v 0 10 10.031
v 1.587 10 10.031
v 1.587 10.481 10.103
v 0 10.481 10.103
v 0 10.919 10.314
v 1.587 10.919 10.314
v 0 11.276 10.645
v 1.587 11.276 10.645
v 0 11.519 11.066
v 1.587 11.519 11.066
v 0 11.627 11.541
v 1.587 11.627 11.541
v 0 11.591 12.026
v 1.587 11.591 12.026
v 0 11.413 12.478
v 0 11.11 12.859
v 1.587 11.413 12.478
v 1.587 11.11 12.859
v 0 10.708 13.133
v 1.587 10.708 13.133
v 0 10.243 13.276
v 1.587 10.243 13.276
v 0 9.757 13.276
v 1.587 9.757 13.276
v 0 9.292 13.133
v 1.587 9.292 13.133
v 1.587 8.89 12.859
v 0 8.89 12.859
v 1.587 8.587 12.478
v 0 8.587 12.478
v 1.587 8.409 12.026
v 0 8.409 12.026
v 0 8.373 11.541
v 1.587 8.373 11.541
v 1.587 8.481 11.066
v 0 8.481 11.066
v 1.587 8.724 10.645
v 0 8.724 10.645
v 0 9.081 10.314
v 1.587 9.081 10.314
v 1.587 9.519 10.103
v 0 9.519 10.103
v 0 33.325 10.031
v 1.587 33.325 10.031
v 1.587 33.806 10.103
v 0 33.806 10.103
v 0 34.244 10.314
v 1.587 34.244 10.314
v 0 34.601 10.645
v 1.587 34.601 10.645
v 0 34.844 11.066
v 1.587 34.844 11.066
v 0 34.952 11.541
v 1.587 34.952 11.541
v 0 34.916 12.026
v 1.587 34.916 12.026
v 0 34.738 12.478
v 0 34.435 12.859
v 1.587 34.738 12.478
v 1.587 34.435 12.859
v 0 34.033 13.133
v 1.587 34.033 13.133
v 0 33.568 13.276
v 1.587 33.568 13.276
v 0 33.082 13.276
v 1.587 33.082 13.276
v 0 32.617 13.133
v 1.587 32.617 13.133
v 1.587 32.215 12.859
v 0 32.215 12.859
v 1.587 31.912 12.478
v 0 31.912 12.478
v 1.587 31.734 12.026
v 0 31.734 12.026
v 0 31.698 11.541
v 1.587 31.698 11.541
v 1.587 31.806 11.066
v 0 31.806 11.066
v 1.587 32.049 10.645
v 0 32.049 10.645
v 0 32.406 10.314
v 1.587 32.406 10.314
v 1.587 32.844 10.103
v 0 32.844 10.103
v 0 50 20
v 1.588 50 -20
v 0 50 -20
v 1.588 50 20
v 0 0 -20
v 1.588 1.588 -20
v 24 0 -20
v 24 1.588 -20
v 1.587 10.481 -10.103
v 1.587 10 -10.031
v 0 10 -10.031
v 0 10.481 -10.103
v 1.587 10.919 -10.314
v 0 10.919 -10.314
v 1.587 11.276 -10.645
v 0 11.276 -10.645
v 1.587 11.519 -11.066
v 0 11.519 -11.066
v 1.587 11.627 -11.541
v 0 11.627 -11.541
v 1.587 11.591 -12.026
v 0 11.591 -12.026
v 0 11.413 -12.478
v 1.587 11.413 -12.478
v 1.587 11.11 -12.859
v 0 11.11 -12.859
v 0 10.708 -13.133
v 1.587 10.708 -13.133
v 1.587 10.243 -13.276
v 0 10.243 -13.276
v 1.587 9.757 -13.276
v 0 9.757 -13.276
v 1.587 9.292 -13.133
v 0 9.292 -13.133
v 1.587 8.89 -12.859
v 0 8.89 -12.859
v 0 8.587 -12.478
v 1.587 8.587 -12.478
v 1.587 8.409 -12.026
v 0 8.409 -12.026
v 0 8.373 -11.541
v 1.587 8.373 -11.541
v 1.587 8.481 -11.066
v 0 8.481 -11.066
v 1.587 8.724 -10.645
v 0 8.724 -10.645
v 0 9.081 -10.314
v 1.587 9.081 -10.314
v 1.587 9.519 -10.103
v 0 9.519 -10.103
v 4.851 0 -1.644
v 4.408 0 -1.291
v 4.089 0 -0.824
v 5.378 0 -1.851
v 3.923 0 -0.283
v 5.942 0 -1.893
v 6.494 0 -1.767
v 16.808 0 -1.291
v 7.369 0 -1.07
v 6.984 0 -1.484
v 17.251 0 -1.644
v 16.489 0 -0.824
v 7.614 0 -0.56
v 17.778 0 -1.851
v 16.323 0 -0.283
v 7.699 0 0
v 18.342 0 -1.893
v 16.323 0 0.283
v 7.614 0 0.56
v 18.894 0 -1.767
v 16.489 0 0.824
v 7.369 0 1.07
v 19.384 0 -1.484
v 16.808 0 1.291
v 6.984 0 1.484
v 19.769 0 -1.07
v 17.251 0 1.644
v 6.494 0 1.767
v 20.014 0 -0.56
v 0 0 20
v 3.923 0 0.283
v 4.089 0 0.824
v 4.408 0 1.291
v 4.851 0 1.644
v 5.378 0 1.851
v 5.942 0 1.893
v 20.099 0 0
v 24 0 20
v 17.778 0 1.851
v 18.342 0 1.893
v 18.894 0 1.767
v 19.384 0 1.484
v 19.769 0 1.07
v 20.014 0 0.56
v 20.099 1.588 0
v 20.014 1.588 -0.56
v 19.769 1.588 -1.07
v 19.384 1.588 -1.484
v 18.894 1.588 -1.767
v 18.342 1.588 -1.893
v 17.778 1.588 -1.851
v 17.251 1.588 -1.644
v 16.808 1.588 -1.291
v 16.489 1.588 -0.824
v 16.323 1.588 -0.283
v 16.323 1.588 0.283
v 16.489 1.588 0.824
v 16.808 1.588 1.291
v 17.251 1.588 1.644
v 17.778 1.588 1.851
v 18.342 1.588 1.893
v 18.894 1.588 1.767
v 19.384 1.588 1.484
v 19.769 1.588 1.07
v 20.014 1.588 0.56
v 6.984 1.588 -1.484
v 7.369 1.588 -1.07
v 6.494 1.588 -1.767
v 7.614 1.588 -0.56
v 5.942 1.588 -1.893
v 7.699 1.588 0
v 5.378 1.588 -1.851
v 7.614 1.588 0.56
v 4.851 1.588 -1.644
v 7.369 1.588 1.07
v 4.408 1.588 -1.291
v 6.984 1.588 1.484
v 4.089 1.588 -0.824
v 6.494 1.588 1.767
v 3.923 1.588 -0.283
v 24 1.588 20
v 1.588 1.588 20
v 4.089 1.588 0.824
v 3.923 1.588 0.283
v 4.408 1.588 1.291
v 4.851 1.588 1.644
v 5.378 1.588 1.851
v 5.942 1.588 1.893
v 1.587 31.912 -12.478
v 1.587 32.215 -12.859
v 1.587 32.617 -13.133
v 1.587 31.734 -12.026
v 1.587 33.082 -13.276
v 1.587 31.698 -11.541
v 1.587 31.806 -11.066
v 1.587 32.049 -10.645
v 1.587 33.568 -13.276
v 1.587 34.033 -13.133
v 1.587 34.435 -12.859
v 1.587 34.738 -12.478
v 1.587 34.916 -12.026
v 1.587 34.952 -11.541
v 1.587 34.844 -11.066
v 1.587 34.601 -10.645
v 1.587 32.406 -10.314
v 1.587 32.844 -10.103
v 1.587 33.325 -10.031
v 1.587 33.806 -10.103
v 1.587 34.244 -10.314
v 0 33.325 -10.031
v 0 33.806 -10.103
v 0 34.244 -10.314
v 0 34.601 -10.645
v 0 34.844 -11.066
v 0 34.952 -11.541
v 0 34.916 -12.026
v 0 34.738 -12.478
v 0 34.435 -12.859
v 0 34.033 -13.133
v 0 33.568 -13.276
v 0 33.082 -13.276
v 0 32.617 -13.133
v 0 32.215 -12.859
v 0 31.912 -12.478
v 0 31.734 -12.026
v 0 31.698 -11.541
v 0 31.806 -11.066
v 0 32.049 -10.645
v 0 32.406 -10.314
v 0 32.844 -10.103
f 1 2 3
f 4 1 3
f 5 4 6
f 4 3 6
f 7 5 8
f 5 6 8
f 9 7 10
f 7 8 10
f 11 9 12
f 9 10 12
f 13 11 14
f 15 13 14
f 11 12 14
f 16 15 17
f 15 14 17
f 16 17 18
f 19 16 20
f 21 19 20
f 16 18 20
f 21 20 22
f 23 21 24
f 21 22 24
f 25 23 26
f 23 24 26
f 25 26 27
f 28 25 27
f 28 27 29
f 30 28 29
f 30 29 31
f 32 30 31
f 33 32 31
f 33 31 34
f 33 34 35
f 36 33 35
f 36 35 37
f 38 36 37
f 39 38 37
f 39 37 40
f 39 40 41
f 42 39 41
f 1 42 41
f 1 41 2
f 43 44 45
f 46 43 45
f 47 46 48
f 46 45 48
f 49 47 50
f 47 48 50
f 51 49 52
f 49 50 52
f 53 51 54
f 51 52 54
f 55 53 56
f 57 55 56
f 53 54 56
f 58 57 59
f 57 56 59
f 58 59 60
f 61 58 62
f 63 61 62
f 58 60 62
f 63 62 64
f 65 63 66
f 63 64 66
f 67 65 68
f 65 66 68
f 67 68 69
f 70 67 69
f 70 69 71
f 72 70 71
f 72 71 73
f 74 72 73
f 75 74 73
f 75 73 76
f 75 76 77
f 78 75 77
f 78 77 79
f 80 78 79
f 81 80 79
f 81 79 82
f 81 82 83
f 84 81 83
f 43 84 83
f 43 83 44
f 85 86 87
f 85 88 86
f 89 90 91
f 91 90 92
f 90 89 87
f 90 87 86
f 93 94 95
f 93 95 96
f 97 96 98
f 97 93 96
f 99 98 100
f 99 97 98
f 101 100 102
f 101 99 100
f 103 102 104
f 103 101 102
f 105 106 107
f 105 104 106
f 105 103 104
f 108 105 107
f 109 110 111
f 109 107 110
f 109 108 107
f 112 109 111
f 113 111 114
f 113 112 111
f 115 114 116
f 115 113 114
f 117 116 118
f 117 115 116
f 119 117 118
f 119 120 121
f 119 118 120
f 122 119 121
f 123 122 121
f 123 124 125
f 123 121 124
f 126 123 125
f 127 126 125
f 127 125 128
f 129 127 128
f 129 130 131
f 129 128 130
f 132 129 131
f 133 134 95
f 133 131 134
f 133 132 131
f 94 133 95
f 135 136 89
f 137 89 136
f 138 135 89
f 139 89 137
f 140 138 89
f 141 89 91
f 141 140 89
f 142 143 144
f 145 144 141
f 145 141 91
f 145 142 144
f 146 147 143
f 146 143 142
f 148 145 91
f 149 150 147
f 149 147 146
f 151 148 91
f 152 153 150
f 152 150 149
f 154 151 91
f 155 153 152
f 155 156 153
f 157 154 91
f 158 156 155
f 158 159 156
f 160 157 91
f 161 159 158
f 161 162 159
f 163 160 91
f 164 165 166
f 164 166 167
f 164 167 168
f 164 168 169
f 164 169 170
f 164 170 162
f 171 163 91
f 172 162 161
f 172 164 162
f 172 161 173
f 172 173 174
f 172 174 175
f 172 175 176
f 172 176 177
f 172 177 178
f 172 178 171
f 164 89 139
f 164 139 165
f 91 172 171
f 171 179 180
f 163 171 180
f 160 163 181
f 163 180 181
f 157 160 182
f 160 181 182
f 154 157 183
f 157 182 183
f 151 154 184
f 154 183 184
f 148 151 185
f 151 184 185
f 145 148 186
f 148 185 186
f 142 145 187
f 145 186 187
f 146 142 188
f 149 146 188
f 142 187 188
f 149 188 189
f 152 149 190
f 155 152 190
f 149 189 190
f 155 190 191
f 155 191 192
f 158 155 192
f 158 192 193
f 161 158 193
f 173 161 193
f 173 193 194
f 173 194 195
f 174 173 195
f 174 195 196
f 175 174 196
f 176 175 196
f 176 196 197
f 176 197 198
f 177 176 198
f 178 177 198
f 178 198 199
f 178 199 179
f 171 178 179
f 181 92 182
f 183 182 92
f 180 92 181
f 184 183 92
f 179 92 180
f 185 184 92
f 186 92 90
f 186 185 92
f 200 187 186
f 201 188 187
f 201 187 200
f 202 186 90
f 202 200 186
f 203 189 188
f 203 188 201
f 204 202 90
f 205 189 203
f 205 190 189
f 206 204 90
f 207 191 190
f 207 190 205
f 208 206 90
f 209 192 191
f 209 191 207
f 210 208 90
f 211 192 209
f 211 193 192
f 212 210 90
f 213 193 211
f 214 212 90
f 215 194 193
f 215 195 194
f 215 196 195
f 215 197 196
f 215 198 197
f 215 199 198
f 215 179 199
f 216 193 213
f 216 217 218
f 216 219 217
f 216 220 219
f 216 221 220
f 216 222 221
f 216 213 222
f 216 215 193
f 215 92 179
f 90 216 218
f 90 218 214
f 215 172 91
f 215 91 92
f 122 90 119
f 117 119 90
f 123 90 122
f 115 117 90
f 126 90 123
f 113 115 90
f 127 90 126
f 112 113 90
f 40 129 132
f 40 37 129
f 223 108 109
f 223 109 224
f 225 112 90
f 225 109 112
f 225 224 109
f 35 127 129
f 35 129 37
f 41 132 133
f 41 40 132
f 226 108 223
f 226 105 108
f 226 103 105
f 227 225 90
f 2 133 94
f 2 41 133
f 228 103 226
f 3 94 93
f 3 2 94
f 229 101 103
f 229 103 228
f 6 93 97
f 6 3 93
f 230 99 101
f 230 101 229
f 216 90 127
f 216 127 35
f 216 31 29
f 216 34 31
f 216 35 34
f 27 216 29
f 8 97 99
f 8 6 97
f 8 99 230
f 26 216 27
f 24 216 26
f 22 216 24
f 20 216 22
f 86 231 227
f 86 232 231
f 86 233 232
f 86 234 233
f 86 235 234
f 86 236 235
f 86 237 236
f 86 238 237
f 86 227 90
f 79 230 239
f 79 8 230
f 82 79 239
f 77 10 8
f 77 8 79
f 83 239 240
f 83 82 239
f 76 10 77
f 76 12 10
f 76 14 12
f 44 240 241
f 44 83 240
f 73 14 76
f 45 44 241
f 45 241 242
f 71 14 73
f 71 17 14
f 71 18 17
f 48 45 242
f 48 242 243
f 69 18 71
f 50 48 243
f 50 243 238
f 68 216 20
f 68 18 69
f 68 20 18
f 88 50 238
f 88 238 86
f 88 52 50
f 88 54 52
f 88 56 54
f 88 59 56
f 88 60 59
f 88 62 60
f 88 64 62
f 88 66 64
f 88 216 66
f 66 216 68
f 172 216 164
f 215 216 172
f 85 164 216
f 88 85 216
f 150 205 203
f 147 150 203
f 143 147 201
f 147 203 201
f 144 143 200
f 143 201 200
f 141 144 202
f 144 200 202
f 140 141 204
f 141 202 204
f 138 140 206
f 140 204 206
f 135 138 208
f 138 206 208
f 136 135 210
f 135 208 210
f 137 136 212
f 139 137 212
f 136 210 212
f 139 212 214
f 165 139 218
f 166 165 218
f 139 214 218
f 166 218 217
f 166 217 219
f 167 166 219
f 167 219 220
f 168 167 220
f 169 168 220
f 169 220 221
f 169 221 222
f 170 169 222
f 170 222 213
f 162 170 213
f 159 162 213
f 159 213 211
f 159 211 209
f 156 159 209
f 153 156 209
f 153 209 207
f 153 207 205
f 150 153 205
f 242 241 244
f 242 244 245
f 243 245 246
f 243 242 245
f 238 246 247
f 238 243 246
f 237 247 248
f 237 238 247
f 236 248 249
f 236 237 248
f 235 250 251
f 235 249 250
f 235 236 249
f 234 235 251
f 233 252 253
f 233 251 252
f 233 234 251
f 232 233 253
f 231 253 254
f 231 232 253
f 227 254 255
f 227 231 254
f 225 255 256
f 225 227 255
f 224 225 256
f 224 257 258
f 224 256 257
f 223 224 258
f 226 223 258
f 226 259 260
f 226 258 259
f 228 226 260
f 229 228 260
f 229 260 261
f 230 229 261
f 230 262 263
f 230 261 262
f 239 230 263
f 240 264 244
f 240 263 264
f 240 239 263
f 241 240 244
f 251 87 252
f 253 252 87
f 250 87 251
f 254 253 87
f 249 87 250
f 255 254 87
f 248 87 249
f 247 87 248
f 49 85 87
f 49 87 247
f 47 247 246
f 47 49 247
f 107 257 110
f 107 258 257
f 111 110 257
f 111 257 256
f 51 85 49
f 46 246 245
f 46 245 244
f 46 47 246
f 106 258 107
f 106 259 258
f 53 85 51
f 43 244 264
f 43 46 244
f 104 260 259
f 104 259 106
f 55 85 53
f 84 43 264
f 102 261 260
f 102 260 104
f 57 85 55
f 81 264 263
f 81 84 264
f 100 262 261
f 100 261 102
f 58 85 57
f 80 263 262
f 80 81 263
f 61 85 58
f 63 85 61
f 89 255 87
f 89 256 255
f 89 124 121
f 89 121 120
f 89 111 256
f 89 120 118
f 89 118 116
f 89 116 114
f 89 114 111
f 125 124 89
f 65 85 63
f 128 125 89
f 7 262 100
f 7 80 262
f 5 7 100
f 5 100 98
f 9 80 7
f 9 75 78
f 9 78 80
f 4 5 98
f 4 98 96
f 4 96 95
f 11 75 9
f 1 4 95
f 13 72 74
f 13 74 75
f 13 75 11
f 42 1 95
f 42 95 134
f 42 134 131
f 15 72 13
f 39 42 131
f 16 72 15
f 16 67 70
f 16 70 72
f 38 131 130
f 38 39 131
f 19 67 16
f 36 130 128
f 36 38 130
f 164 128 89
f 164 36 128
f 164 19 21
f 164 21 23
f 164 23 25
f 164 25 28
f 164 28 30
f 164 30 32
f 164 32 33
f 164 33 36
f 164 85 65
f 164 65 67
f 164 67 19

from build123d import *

# Parameters (mm, degrees)
BOSS_EXTRUDE1_DEPTH   = 20
F_4_CLEARANCE_HOLE1_D = 3.2639
F_6_CLEARANCE_HOLE1_D = 3.7973


with BuildPart() as part:
    # Sketch1 → Boss-Extrude1 (new body)
    with BuildSketch(Plane.XY):
        Polygon((0, 50), (0, 0), (24, 0), (24, 1.5875), (1.5875, 1.5875), (1.5875, 50), align=None)
    boss_extrude1 = extrude(amount=BOSS_EXTRUDE1_DEPTH)

    # #4 Clearance Hole1 (through all)
    with Locations(Plane.ZY):
        with Locations((11.6625, 33.325), (11.6625, 10)):
            f_4_clearance_hole1 = Hole(F_4_CLEARANCE_HOLE1_D / 2)

    # Mirror1: Boss-Extrude1, #4 Clearance Hole1 across plane
    add(boss_extrude1.mirror(Plane(origin=(0, 0, 0), x_dir=(1, 0, 0), z_dir=(0, 0, -1))))
    add(f_4_clearance_hole1.mirror(Plane(origin=(0, 0, 0), x_dir=(1, 0, 0), z_dir=(0, 0, -1))), mode=Mode.SUBTRACT)

    # #6 Clearance Hole1 (through all)
    with Locations(Plane(origin=(0, 0, 0), x_dir=(-1, 0, 0), z_dir=(0, -1, 0))):
        with Locations((-18.2, 0), (-5.8, 0)):
            Hole(F_6_CLEARANCE_HOLE1_D / 2)


solid = part.part
